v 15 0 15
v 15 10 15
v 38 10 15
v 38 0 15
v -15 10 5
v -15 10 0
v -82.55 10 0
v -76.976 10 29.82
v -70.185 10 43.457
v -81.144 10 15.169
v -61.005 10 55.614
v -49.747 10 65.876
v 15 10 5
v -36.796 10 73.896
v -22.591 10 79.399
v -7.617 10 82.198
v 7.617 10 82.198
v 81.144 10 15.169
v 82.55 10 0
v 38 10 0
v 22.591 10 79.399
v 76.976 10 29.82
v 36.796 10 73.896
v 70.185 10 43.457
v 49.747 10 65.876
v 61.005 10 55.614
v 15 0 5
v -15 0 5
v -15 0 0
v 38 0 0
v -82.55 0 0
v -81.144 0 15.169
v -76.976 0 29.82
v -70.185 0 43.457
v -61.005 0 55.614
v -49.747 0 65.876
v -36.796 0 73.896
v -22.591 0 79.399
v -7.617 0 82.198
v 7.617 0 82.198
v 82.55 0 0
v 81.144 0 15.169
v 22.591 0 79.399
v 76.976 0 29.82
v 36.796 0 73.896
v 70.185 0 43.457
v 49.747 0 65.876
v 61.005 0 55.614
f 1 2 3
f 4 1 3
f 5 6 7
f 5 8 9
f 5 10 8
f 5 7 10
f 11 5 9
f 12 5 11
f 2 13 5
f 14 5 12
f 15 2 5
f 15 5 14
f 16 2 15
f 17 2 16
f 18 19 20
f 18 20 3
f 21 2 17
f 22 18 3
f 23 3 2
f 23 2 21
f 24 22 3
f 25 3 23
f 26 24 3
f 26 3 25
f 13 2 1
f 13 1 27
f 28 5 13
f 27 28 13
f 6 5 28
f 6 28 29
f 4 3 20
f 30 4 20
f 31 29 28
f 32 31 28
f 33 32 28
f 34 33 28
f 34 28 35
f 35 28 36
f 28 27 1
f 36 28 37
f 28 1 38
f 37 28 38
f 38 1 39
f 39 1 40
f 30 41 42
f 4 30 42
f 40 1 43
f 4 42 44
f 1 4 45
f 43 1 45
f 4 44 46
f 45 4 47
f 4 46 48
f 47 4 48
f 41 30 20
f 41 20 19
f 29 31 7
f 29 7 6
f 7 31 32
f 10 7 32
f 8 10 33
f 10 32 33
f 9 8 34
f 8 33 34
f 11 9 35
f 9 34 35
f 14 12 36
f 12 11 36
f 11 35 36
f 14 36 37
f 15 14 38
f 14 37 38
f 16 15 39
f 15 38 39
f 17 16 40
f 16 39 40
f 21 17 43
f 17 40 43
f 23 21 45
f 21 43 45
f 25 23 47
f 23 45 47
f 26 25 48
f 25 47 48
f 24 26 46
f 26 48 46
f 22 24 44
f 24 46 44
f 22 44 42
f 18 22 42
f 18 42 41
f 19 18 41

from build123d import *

# Parameters (mm, degrees)
SKETCH1_R           = 82.55
BOSS_EXTRUDE1_DEPTH = 10
SKETCH2_W           = 30
SKETCH2_H           = 10
CUT_EXTRUDE1_DEPTH  = 13
CUT_EXTRUDE2_START  = -10
CUT_EXTRUDE2_DEPTH  = 10
SKETCH5_W           = 23
SKETCH5_H           = 30
CUT_EXTRUDE4_DEPTH  = 10


with BuildPart() as part:
    # Sketch1 → Boss-Extrude1 (new body)
    with BuildSketch(Plane(origin=(0, 0, 0), x_dir=(1, 0, 0), z_dir=(0, 1, 0))):
        with Locations(Location((0, 0, 0), (0, 0, 270))):
            Circle(SKETCH1_R)
    extrude(amount=BOSS_EXTRUDE1_DEPTH)

    # Sketch2 → Cut-Extrude1 (cut)
    with BuildSketch(Plane(origin=(0, 13, 0), x_dir=(1, 0, 0), z_dir=(0, 1, 0))):
        Rectangle(SKETCH2_W, SKETCH2_H)
    extrude(amount=-CUT_EXTRUDE1_DEPTH, mode=Mode.SUBTRACT)

    # Sketch3 → Cut-Extrude2 (cut)
    with BuildSketch(Plane(origin=(0, 10, 0), x_dir=(1, 0, 0), z_dir=(0, 1, 0)).offset(CUT_EXTRUDE2_START)):
        with BuildLine():
            ThreePointArc((82.55, 0), (0, 82.55), (-82.55, 0))
            Line((-82.55, 0), (-15, 0))
            Line((-15, 0), (-15, 5))
            Line((-15, 5), (15, 5))
            Line((15, 5), (15, 0))
            Line((15, 0), (82.55, 0))
        make_face()
    extrude(amount=CUT_EXTRUDE2_DEPTH, mode=Mode.SUBTRACT)

    # Sketch5 → Cut-Extrude4 (cut)
    with BuildSketch(Plane(origin=(0, 10, 0), x_dir=(1, 0, 0), z_dir=(0, 1, 0))):
        with Locations((26.5, 0)):
            Rectangle(SKETCH5_W, SKETCH5_H)
    extrude(amount=-CUT_EXTRUDE4_DEPTH, mode=Mode.SUBTRACT)


solid = part.part
